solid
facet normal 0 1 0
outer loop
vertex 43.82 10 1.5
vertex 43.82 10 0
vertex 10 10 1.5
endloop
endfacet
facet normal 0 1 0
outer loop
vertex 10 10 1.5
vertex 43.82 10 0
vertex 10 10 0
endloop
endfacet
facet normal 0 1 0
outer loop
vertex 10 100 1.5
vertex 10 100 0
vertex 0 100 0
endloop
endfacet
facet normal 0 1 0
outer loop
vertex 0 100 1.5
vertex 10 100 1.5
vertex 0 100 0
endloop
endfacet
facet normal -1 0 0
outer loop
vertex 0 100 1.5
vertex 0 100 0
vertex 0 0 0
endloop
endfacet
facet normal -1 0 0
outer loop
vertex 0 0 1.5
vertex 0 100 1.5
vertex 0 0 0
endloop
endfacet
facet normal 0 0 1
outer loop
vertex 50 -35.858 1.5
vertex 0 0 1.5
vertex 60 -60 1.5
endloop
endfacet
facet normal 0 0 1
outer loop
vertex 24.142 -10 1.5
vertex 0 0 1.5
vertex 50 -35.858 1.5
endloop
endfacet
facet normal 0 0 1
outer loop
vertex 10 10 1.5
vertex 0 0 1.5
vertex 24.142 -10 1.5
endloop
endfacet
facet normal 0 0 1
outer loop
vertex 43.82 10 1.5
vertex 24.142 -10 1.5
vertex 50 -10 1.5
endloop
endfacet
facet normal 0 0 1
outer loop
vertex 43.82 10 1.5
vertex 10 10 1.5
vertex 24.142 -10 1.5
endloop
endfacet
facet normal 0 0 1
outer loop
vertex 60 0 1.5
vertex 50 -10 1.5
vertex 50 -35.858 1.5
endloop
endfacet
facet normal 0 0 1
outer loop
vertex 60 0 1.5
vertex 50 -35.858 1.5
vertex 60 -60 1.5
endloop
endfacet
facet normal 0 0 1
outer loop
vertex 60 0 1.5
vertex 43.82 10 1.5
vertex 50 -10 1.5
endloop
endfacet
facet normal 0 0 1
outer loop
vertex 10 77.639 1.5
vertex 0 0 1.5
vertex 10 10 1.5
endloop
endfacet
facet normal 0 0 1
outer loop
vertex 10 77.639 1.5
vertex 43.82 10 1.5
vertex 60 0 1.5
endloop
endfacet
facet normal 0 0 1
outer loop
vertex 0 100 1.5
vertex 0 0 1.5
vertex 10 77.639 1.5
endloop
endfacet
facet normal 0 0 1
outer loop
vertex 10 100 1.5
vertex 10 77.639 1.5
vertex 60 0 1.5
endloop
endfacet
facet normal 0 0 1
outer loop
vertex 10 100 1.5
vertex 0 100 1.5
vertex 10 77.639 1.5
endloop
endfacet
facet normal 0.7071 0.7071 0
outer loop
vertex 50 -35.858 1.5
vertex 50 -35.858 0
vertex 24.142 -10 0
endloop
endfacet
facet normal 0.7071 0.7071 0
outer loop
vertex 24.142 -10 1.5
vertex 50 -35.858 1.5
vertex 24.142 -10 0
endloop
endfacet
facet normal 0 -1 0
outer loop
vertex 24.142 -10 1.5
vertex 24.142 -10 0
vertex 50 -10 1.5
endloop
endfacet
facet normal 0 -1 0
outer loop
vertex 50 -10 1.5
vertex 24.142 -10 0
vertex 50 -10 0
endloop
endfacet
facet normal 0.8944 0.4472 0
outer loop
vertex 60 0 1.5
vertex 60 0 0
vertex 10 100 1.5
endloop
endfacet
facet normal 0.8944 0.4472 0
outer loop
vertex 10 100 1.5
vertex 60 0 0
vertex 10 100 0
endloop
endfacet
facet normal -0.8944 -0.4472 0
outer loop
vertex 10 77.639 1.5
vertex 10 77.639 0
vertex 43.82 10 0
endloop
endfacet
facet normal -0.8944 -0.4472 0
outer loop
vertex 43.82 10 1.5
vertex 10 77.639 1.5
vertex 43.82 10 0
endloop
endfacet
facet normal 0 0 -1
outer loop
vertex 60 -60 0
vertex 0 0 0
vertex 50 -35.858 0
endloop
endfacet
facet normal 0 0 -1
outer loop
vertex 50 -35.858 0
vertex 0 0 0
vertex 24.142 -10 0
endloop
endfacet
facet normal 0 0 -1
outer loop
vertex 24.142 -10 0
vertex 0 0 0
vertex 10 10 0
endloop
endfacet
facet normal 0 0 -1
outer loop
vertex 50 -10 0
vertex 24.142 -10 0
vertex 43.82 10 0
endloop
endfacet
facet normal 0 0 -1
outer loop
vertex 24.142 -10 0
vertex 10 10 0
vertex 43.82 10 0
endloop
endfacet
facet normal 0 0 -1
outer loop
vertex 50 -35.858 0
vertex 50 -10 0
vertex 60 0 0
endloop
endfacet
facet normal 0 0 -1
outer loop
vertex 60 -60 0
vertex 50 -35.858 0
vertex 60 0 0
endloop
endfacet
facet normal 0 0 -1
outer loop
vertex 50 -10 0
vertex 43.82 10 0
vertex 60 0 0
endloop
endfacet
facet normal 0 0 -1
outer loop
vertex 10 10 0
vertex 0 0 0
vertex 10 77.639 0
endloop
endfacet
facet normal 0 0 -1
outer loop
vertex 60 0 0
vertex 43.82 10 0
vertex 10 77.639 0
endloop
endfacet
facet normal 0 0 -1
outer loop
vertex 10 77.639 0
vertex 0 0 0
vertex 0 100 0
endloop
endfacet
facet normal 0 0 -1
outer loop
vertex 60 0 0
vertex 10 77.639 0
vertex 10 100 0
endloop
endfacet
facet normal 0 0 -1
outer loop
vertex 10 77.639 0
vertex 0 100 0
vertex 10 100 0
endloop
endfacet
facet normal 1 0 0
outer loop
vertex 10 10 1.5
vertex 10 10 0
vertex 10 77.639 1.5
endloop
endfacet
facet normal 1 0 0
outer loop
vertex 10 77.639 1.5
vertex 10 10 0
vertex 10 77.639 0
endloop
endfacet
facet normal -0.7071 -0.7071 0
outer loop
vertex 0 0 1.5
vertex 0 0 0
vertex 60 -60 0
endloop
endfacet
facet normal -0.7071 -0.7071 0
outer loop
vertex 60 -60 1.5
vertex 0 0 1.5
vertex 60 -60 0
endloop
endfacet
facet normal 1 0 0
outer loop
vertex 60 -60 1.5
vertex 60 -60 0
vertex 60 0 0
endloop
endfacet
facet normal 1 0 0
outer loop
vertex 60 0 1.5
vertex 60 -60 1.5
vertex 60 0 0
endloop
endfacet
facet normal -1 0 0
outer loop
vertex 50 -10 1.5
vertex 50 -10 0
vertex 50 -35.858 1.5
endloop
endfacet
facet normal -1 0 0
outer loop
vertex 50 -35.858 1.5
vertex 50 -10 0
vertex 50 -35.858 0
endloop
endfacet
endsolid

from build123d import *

# Parameters (mm, degrees)
F1_DEPTH = 1.5


with BuildPart() as f1:
    # F0 (on Top) → F1 (new body)
    with BuildSketch(Plane.XY):
        Polygon((60, 0), (0, 0), (60, -60), align=None)
        Polygon((50, -10), (50, -35.857864), (24.142136, -10), align=None, mode=Mode.SUBTRACT)
        Polygon((0, 100), (0, 0), (60, 0), (10, 100), align=None)
        Polygon((43.81966, 10), (10, 10), (10, 77.63932), align=None, mode=Mode.SUBTRACT)
    extrude(amount=F1_DEPTH)


solid = f1.part
